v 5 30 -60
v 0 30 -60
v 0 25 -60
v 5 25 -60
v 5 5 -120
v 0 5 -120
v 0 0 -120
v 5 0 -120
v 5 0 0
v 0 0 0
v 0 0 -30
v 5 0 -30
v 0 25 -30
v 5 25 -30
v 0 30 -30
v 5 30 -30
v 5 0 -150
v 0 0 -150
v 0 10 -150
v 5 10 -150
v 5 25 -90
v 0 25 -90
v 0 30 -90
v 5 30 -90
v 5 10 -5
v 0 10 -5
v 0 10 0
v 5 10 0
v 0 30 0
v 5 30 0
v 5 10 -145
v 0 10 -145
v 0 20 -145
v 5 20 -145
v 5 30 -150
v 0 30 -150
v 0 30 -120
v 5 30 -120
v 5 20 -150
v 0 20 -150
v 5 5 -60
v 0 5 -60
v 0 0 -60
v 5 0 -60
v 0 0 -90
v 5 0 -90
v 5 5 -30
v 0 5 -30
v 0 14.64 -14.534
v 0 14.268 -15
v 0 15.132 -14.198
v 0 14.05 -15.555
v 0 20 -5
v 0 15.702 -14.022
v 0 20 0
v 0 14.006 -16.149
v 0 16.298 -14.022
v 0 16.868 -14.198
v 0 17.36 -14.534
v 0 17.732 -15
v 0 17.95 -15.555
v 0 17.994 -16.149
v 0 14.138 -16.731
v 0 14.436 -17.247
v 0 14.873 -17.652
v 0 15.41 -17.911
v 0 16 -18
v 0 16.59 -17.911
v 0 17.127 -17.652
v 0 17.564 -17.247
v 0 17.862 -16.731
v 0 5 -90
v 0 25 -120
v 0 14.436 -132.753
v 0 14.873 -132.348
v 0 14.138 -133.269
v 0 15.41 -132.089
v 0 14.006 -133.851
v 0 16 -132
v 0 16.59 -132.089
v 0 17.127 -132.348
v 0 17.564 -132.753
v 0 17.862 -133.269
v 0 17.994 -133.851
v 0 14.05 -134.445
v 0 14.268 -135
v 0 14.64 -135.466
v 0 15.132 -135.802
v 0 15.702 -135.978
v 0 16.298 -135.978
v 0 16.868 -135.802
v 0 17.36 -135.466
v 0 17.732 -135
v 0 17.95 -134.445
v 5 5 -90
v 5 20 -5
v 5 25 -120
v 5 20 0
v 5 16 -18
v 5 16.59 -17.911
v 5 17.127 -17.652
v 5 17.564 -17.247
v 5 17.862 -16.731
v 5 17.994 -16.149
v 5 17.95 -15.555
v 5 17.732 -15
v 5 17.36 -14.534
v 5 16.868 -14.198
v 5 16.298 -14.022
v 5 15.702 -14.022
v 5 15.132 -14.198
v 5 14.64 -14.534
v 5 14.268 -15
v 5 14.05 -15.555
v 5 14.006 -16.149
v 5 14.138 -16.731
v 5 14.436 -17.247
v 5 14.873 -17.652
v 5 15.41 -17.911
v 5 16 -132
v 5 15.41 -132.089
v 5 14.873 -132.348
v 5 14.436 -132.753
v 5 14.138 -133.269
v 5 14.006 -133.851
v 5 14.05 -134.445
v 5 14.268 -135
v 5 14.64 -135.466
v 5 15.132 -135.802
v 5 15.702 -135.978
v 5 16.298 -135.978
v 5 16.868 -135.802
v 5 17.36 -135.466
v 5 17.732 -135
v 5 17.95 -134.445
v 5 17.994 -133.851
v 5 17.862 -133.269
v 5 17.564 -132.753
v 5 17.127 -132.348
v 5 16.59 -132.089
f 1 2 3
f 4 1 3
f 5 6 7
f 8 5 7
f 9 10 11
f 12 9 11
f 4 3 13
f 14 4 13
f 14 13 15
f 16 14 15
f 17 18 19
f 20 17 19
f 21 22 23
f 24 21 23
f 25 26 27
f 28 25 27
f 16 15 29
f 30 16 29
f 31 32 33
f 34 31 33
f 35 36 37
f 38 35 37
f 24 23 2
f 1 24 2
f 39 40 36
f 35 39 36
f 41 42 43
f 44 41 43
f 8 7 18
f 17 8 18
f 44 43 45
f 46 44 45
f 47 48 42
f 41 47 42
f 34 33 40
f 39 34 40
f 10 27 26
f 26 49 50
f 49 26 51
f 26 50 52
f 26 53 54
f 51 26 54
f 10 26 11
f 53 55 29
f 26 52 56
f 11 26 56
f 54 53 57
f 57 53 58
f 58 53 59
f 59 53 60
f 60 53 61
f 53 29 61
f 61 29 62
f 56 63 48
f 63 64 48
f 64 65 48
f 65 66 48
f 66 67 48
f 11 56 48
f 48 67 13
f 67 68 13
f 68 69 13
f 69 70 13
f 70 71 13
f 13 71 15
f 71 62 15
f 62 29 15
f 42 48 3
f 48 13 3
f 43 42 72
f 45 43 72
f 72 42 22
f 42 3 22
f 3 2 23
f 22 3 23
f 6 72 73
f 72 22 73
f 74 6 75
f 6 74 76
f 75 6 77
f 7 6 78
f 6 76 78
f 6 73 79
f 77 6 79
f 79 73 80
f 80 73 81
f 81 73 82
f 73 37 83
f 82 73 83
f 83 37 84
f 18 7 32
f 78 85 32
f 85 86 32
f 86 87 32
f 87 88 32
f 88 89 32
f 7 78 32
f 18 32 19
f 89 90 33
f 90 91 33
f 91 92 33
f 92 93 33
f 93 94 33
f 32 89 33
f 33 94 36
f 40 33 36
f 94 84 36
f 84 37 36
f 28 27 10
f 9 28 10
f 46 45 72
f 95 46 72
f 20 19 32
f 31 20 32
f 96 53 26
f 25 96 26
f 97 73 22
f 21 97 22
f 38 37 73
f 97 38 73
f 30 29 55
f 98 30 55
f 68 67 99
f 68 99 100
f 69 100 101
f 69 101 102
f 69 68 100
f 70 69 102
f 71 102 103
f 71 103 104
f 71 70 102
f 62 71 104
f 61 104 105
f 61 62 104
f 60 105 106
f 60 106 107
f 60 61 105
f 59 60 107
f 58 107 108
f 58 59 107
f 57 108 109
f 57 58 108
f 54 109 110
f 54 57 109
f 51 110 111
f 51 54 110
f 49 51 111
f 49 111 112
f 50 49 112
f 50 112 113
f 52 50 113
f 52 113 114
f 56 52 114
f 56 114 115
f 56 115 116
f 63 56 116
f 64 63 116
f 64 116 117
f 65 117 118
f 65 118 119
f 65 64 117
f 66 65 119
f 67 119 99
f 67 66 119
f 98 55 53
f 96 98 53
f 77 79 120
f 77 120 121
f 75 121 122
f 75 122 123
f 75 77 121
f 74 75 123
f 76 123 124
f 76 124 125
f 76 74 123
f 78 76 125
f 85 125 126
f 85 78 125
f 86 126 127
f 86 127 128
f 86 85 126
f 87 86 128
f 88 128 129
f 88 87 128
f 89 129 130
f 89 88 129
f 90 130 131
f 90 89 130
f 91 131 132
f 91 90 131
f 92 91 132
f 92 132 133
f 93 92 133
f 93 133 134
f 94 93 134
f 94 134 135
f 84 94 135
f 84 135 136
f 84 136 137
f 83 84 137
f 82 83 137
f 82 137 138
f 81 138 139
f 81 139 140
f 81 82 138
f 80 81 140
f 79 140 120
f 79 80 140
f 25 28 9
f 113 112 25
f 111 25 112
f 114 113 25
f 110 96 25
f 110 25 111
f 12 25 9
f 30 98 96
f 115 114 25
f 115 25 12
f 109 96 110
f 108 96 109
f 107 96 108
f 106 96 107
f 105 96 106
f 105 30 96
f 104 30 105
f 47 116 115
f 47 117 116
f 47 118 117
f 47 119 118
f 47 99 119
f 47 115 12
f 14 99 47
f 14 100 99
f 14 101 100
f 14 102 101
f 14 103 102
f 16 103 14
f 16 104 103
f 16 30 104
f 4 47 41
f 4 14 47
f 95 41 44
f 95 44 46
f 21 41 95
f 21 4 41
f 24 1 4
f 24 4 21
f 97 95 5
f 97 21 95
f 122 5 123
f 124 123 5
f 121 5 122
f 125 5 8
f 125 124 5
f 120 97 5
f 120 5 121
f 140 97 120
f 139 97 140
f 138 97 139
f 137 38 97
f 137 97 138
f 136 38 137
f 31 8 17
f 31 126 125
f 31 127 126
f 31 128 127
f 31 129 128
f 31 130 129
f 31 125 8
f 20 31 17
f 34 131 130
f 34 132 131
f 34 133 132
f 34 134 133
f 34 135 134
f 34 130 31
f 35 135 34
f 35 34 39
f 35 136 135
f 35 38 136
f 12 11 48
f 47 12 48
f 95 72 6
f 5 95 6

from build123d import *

# Parameters (mm, degrees)
CROQUIS1_R              = 2
SALIENTE_EXTRUIR1_DEPTH = 5


with BuildPart() as part:
    # Croquis1 → Saliente-Extruir1 (new body)
    with BuildSketch(Plane(origin=(0, 0, 0), x_dir=(0, 0, -1), z_dir=(1, 0, 0))):
        Polygon((0, 20), (5, 20), (5, 10), (0, 10), (0, 0), (30, 0), (30, 5), (60, 5), (60, 0), (90, 0), (90, 5), (120, 5), (120, 0), (150, 0), (150, 10), (145, 10), (145, 20), (150, 20), (150, 30), (120, 30), (120, 25), (90, 25), (90, 30), (60, 30), (60, 25), (30, 25), (30, 30), (0, 30), align=None)
        with Locations((16, 16)):
            Circle(CROQUIS1_R, mode=Mode.SUBTRACT)
        with Locations(Location((134, 16, 0), (0, 0, 180))):
            Circle(CROQUIS1_R, mode=Mode.SUBTRACT)
    extrude(amount=SALIENTE_EXTRUIR1_DEPTH)


solid = part.part
